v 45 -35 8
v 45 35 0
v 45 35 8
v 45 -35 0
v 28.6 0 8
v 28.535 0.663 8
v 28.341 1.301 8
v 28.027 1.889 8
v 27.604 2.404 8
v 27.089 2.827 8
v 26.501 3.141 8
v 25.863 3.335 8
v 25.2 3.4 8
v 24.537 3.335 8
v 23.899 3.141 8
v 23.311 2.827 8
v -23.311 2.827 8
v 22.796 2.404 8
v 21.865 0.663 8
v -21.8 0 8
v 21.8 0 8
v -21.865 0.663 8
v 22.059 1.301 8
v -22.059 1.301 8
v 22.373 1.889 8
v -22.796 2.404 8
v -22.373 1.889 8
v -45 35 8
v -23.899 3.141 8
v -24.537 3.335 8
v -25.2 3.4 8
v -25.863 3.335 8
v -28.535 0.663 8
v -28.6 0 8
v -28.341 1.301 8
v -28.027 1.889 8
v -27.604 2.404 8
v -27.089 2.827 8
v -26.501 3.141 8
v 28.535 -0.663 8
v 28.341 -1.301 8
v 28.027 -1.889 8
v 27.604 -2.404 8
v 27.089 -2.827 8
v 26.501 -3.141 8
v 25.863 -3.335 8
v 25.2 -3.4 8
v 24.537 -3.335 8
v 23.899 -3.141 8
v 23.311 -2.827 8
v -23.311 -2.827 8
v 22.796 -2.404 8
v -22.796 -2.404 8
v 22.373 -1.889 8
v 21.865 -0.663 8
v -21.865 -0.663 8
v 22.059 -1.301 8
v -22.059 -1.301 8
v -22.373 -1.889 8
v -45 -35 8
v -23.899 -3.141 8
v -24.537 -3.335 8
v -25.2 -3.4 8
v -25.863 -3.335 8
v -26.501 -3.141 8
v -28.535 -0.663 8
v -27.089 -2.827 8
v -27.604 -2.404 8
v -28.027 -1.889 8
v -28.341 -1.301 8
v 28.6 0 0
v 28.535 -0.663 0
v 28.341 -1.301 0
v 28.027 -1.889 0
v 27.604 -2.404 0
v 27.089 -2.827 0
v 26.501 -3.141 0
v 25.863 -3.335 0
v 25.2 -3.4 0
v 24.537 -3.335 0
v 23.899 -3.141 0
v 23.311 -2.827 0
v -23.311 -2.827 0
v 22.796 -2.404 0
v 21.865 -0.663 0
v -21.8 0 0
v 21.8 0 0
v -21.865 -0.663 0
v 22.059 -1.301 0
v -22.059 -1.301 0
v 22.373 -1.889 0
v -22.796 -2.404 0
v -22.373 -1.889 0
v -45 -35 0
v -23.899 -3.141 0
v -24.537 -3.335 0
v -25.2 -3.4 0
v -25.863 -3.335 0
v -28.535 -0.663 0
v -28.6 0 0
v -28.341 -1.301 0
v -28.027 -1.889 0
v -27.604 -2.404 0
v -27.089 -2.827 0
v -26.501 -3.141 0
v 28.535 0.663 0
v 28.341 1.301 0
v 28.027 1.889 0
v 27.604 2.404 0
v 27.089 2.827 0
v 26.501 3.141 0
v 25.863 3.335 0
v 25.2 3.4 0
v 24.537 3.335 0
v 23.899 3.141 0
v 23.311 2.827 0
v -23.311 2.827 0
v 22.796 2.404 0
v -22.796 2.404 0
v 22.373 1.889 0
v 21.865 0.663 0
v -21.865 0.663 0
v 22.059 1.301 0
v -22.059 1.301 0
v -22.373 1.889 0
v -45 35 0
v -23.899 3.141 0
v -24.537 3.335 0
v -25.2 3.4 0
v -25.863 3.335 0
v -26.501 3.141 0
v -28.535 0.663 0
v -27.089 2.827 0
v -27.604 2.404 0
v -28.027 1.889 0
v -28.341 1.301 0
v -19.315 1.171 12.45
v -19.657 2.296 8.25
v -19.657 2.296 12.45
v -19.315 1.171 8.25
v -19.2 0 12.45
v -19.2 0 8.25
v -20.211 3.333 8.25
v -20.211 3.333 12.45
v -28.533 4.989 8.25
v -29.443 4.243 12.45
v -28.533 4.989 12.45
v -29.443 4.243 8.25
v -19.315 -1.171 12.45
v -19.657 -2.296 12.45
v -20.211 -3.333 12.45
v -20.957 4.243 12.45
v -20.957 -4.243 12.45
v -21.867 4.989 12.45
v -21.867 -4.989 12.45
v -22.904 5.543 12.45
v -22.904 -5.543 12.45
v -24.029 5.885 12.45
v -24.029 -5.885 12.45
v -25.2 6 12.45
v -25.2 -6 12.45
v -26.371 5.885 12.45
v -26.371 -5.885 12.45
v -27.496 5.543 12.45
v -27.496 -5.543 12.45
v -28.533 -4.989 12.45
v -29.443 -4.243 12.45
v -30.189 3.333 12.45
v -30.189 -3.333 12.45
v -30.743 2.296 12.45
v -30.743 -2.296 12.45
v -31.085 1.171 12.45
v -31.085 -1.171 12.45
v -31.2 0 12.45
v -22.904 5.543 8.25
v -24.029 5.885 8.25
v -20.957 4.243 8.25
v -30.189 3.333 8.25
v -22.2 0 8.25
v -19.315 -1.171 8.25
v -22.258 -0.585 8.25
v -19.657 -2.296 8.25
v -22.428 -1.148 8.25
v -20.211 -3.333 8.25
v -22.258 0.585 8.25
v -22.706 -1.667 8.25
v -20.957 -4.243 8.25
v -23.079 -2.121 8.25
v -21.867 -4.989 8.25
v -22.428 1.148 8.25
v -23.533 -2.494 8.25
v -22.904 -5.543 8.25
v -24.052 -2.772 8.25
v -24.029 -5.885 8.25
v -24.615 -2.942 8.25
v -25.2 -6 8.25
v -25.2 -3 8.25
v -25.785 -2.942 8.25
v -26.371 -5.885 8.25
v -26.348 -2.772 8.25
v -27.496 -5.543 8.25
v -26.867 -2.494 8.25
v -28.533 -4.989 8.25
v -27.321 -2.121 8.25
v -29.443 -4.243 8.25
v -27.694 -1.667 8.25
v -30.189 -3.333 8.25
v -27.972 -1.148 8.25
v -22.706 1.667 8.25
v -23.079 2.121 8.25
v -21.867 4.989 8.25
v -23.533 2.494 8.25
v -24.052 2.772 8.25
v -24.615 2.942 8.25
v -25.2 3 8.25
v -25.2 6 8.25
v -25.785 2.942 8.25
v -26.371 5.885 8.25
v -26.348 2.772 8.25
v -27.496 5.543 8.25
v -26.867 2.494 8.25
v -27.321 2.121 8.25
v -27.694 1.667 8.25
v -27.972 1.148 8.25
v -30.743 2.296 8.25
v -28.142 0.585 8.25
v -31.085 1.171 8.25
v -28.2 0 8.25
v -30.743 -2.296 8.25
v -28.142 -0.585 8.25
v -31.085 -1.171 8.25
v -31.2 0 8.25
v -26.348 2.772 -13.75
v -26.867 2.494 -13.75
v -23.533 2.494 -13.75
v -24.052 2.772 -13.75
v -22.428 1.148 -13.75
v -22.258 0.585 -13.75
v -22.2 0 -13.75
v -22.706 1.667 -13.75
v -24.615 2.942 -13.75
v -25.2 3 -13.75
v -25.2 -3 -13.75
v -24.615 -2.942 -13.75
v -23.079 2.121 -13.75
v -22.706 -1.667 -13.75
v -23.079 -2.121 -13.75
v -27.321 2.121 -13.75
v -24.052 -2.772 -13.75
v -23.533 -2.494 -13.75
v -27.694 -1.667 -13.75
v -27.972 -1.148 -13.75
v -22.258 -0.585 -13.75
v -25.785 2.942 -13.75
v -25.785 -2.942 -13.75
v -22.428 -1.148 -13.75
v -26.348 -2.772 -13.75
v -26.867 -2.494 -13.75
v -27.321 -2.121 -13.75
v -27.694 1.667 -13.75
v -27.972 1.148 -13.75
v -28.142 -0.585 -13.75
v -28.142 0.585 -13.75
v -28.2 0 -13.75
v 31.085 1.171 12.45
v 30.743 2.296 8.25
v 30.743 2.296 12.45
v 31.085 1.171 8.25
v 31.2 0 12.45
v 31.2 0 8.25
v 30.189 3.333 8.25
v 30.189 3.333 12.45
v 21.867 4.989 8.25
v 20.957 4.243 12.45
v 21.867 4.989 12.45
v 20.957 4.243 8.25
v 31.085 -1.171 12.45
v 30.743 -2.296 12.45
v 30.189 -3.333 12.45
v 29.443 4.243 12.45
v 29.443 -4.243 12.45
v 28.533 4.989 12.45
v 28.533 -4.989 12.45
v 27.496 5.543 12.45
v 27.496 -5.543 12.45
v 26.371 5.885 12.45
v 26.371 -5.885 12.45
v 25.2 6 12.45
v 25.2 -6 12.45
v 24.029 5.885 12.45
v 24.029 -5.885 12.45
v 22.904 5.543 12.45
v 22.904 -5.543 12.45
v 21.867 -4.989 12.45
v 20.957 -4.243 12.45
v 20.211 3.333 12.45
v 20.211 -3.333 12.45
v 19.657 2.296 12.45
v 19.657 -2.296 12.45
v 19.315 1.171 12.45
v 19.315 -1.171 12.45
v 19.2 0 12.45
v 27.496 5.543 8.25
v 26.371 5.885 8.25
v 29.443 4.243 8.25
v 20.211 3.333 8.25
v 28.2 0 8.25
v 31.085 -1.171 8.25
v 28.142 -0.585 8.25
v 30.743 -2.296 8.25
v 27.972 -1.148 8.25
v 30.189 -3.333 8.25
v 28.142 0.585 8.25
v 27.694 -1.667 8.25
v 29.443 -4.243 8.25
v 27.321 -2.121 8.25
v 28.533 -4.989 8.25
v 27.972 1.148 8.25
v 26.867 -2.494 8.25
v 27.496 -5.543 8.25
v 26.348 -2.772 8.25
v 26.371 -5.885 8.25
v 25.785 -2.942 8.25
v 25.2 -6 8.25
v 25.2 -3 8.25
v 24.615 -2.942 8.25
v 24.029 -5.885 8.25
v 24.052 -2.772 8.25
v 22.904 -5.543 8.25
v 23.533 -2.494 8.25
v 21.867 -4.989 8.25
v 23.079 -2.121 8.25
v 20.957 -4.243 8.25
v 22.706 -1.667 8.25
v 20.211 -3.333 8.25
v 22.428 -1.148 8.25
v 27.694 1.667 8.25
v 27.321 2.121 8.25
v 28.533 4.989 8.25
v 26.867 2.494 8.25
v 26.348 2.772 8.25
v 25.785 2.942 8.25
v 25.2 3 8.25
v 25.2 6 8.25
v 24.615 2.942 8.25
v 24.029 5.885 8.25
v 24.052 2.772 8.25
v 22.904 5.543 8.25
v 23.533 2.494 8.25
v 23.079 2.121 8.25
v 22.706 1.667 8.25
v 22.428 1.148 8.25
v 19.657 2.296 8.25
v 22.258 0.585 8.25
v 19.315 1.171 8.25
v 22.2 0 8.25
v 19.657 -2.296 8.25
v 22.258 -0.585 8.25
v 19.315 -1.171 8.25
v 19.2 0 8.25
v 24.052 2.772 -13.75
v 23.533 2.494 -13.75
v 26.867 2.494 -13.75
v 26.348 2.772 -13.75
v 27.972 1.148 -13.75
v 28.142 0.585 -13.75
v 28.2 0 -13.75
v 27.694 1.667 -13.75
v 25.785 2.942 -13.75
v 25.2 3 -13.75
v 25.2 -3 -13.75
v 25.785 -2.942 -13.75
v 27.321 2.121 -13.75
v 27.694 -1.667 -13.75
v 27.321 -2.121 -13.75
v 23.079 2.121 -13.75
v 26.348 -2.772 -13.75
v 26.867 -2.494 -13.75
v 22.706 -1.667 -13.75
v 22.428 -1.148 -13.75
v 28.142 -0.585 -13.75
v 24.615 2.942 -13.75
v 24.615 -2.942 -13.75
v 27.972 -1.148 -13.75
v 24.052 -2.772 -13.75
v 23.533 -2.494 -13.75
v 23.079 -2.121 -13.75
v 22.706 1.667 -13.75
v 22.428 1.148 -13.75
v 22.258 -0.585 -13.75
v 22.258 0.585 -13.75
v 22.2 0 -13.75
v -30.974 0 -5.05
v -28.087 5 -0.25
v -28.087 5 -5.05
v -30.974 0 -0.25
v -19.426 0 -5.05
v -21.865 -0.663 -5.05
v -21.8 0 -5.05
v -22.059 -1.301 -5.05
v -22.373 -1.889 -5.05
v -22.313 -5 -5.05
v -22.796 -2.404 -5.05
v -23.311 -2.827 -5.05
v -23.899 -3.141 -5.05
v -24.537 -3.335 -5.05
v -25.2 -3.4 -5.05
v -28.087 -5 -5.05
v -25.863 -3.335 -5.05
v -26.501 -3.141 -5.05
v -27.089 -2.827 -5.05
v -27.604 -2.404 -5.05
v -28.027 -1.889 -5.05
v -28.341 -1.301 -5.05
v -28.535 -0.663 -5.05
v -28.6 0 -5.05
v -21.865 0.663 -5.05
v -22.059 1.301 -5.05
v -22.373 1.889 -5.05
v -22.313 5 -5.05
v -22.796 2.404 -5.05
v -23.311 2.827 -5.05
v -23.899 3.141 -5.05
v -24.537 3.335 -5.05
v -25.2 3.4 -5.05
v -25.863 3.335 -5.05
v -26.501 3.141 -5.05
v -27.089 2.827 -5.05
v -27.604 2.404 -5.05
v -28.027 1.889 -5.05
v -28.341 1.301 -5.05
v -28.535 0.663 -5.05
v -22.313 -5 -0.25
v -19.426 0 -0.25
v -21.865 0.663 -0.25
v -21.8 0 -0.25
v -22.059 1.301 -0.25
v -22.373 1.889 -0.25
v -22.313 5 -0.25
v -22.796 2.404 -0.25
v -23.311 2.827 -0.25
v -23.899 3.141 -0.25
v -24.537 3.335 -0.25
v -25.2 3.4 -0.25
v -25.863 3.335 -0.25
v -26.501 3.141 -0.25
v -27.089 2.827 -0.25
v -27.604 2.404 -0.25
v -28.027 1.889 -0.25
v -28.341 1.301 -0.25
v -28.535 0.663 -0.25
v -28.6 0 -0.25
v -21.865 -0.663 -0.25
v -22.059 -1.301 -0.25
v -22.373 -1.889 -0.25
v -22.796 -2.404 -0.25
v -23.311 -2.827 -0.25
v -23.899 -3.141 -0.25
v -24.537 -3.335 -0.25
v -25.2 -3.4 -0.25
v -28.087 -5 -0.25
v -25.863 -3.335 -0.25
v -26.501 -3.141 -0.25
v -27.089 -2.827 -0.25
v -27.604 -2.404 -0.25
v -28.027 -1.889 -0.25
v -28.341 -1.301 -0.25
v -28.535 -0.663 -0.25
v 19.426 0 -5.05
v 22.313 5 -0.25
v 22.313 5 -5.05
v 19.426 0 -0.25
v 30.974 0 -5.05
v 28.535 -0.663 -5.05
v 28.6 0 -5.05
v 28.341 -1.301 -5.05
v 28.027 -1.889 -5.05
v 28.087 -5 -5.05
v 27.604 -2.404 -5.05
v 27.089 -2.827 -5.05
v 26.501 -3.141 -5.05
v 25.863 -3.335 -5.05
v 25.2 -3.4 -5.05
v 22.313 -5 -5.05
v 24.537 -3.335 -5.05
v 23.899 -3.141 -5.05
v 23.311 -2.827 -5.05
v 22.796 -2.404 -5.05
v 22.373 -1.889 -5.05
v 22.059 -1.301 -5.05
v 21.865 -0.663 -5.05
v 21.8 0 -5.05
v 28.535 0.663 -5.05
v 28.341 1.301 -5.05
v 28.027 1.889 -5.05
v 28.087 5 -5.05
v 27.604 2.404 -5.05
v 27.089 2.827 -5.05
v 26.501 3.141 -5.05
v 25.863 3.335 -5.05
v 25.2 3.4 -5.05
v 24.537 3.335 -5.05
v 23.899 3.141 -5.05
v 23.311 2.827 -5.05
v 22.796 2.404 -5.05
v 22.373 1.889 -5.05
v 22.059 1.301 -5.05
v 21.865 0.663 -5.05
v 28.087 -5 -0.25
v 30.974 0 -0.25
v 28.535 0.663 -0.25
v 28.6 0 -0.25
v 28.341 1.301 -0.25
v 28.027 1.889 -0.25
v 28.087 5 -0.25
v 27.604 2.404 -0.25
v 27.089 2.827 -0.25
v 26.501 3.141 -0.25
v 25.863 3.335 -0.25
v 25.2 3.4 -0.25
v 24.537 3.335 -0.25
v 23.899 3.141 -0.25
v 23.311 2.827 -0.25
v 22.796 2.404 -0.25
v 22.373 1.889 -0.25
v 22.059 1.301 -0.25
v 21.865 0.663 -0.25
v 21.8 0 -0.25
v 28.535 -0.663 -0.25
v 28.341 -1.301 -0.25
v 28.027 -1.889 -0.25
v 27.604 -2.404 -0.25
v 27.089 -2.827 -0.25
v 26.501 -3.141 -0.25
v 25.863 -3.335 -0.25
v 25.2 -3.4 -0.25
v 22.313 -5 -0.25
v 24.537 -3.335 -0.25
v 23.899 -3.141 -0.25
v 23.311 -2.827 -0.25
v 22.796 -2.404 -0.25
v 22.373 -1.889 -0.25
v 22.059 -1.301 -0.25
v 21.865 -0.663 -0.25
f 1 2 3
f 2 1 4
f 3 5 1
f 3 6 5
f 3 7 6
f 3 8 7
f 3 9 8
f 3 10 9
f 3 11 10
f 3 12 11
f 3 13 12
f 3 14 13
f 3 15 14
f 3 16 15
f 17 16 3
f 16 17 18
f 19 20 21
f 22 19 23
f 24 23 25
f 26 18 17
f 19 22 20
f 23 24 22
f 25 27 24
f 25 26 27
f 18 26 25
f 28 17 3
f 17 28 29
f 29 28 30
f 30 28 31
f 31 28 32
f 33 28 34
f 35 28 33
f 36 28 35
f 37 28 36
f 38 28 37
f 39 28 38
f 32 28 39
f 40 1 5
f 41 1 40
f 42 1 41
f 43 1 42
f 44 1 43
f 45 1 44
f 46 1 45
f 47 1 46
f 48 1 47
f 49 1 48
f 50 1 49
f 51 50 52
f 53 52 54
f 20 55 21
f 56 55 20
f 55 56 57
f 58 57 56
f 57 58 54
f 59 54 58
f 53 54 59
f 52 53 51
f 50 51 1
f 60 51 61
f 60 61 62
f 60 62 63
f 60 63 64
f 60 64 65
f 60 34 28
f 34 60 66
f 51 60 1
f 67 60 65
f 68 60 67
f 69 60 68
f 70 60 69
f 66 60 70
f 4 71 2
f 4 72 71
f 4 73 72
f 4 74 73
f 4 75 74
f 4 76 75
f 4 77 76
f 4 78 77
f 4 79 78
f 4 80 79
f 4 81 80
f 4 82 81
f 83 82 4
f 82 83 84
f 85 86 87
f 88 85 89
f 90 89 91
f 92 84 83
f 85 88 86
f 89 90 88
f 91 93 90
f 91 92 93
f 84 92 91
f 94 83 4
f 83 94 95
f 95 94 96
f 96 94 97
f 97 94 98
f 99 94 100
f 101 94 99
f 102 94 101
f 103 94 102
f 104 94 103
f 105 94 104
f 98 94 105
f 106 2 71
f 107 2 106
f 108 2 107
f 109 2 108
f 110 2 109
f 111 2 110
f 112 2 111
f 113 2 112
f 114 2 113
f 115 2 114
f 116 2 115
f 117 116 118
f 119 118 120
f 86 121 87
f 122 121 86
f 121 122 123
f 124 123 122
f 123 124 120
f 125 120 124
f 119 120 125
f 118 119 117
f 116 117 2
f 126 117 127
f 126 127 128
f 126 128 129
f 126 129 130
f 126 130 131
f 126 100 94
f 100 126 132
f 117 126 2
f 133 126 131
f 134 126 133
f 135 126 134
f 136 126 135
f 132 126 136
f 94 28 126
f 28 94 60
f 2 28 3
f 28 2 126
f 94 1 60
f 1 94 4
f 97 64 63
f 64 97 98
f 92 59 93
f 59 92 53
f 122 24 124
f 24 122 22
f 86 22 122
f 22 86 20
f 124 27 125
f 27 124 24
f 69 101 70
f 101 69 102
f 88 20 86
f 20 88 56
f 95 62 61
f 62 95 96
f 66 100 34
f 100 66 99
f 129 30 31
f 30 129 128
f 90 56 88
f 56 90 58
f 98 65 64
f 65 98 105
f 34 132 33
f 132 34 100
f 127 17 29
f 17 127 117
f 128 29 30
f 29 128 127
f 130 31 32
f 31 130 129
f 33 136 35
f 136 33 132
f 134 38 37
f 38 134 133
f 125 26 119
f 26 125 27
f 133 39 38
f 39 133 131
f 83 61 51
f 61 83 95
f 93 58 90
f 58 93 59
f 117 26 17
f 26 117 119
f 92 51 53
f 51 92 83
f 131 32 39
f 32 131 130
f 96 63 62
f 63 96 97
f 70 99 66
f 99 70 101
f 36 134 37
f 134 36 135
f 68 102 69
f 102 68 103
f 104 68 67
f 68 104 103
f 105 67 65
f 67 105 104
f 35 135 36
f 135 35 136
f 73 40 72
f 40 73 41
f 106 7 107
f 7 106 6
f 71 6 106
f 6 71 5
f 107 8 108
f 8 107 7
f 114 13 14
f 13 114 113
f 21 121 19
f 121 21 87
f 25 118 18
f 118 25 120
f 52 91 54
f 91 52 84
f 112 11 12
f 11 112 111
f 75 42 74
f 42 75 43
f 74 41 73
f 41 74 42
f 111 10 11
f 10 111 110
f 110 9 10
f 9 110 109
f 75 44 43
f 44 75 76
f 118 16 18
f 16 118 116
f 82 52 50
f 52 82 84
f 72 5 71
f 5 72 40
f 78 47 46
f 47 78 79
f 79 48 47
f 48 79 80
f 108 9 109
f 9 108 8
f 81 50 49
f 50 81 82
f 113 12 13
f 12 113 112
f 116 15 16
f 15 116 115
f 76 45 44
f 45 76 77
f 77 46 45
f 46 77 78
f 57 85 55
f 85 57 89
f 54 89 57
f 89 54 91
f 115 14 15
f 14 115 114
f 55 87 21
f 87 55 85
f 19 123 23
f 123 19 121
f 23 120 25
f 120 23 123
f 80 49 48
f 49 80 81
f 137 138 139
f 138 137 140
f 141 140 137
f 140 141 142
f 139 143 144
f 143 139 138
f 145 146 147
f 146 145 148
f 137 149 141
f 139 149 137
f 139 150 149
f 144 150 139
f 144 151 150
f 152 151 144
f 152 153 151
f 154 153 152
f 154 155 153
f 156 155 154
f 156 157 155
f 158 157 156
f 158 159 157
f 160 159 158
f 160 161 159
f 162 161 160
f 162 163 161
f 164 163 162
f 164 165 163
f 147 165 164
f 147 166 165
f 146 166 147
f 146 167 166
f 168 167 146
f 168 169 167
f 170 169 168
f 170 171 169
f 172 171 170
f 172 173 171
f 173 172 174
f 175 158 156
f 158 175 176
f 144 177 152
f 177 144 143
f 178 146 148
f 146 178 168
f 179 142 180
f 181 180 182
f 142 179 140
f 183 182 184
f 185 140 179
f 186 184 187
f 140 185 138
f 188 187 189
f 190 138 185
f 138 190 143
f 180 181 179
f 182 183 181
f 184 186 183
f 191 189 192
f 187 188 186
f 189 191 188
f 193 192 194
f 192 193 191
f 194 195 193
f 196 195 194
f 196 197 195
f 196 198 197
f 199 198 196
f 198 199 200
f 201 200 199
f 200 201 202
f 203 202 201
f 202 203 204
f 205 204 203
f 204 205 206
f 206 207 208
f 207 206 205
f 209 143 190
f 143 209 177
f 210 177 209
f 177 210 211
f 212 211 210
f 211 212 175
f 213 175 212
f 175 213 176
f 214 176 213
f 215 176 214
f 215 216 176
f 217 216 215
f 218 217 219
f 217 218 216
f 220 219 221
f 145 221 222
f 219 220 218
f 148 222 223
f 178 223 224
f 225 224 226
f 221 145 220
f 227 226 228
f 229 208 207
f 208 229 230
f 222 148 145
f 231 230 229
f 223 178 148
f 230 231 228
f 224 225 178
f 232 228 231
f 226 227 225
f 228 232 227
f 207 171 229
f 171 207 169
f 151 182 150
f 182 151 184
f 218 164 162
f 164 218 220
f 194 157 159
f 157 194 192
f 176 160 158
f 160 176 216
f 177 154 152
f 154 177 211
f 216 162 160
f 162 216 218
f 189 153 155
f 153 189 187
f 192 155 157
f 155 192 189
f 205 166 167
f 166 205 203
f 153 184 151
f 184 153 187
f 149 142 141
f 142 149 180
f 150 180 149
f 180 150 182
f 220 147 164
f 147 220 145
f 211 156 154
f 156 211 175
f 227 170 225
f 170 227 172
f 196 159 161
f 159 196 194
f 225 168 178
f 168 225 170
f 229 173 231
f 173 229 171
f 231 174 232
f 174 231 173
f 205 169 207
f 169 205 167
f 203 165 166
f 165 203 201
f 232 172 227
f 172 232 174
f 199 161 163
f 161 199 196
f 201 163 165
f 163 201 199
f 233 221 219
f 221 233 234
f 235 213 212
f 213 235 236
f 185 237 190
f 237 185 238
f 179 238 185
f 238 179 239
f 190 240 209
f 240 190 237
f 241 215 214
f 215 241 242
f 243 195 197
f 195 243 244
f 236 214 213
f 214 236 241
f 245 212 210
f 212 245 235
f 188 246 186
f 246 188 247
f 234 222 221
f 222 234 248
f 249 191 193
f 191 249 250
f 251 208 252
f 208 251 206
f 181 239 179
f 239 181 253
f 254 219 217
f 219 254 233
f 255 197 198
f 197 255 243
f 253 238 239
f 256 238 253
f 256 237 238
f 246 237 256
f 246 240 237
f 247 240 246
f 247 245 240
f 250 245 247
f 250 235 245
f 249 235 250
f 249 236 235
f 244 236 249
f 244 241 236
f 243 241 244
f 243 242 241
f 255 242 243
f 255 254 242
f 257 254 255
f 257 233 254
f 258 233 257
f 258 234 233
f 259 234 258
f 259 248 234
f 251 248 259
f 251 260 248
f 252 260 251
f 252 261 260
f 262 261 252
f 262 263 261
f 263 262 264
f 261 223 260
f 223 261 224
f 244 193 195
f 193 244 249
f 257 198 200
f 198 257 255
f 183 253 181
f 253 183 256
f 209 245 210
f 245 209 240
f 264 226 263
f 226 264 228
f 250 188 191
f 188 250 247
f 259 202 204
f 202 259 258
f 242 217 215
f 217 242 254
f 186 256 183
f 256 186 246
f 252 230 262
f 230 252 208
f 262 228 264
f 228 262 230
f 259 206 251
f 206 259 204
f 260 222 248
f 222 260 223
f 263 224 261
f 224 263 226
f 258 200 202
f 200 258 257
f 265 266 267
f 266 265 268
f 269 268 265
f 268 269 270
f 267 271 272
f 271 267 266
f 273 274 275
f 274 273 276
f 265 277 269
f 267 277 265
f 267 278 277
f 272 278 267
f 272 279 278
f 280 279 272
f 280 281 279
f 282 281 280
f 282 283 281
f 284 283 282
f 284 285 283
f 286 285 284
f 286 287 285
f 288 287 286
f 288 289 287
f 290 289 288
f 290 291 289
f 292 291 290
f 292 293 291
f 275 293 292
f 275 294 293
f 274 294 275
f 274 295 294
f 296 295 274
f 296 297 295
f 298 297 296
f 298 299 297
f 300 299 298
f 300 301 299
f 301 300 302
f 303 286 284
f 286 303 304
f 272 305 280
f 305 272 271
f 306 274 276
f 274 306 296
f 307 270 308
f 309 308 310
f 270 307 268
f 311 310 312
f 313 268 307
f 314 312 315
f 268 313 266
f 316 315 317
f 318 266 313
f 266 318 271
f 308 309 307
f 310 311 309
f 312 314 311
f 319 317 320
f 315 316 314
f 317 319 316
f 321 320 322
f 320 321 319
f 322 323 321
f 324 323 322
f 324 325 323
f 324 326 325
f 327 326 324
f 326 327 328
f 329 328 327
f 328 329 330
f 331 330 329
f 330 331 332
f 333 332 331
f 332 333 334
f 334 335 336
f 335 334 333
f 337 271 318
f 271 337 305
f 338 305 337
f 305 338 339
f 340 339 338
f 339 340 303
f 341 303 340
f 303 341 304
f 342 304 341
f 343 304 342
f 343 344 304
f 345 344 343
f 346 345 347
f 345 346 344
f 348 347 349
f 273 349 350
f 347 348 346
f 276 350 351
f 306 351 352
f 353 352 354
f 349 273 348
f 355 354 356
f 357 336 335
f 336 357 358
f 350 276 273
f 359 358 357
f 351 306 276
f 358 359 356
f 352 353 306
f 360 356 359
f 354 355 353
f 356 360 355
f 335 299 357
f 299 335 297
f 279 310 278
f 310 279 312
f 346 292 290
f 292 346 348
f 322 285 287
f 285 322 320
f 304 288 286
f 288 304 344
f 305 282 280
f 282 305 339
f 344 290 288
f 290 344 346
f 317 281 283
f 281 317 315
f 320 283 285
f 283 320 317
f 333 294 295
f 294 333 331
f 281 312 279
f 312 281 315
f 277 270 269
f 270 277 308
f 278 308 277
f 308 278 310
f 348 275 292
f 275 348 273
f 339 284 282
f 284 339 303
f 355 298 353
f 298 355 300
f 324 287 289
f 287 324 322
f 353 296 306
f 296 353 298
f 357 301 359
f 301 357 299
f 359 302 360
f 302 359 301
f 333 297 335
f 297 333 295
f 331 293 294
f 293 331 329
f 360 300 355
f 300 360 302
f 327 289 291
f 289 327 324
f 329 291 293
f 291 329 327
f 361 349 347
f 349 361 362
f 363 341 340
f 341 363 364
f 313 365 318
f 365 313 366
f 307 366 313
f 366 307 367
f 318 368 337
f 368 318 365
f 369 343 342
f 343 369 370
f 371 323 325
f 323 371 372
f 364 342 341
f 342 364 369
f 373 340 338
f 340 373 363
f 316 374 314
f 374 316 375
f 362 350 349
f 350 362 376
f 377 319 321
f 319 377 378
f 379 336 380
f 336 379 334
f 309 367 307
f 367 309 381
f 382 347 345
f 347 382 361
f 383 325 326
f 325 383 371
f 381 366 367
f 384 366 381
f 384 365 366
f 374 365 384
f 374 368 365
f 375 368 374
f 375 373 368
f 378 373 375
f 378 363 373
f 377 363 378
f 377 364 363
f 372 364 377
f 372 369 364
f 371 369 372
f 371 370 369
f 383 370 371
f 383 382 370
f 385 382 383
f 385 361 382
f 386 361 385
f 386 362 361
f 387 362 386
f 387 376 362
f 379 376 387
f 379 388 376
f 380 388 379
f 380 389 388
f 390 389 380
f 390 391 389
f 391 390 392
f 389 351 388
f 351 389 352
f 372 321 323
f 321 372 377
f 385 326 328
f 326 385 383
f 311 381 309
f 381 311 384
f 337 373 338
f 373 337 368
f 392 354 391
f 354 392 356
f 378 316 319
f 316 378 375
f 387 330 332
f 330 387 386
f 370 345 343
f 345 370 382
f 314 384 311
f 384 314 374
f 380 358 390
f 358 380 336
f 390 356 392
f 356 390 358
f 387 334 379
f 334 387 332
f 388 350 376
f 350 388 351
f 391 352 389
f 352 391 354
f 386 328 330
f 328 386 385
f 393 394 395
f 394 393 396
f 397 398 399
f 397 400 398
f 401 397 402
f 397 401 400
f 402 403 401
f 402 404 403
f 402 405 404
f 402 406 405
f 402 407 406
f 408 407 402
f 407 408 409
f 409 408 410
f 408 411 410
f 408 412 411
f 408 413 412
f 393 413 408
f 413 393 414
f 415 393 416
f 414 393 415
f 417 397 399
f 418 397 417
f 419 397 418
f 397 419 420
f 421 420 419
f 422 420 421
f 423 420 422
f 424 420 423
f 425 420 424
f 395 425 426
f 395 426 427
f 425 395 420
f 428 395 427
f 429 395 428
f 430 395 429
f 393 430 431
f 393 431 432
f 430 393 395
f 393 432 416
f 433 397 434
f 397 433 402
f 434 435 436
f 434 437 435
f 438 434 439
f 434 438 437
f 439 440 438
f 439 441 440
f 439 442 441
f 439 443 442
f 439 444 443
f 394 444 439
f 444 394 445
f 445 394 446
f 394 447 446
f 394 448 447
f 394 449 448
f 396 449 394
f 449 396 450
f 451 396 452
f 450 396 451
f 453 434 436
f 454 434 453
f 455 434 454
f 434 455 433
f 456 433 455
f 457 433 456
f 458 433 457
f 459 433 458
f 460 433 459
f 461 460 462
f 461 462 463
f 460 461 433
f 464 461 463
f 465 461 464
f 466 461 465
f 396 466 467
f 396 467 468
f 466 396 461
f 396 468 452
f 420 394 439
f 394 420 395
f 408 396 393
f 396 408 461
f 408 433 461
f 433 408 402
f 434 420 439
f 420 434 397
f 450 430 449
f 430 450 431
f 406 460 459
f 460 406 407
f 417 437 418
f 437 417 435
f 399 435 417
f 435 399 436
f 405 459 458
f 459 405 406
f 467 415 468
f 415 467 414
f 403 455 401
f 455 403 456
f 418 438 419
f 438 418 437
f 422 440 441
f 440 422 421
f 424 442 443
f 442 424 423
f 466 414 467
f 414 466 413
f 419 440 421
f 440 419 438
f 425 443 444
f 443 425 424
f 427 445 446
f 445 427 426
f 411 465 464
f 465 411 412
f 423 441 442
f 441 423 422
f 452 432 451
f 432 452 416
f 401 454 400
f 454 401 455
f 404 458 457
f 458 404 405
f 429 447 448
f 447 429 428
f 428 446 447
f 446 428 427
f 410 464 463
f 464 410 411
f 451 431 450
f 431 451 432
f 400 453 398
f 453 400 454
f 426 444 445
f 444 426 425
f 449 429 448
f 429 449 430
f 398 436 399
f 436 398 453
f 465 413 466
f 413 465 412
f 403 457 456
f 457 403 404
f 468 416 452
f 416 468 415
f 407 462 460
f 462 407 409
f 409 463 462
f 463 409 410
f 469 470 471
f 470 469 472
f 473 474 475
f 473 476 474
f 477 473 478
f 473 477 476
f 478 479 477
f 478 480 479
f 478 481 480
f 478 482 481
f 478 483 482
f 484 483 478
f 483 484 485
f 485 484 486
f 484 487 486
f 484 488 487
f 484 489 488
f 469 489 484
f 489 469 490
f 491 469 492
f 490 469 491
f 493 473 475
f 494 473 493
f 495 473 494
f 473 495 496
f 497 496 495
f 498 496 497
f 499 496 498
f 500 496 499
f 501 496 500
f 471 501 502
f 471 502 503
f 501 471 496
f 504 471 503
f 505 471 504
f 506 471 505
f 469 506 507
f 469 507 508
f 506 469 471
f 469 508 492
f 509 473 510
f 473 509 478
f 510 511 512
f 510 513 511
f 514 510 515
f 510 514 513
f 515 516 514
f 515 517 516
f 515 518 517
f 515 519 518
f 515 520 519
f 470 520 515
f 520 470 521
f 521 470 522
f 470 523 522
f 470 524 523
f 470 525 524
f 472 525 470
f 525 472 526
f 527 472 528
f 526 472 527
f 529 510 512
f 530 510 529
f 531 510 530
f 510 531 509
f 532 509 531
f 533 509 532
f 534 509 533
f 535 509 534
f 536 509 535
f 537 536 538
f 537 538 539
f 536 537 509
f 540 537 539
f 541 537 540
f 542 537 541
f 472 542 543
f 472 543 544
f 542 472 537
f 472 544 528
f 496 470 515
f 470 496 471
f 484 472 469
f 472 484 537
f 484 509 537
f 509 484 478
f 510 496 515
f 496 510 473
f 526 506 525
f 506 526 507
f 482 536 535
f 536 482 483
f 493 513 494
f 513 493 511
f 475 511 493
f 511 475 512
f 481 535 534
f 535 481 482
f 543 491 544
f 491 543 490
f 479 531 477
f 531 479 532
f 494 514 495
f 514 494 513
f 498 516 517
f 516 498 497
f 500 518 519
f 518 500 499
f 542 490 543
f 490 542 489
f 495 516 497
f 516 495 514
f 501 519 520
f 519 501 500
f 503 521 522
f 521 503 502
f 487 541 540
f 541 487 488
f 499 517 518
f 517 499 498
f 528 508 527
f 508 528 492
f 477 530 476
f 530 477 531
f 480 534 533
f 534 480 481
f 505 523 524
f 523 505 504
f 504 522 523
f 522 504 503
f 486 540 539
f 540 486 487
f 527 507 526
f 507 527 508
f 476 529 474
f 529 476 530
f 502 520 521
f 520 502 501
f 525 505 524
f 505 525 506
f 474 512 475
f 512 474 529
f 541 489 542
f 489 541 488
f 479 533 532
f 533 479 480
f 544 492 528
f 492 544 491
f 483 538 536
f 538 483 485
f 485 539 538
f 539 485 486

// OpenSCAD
$fn = 32;

// ------------------------------------------------------------------------
// Bolted plate: 90 x 70 x 8 mm plate, 2 fasteners
// Every part is its own module, assembly() places them once.
// ------------------------------------------------------------------------

// --- part 1 ---
module plate() {
  difference() {
    translate([-45, -35, 0]) cube([90, 70, 8]);
    translate([-25.2, 0, -1]) cylinder(h = 10, d = 6.8);
    translate([25.2, 0, -1]) cylinder(h = 10, d = 6.8);
  }
}

// --- part 2 ---
module bolt1() {
  cylinder(h = 4.2, d = 12);
  translate([0, 0, -22]) cylinder(h = 22, d = 6);
}

// --- part 3 ---
module bolt2() {
  cylinder(h = 4.2, d = 12);
  translate([0, 0, -22]) cylinder(h = 22, d = 6);
}

// --- part 4 ---
module nut1() {
  difference() {
    linear_extrude(height = 4.8) polygon(points = [[5.774, 0], [2.887, 5], [-2.887, 5], [-5.774, 0], [-2.887, -5], [2.887, -5]]);
    translate([0, 0, -1]) cylinder(h = 6.8, d = 6.8);
  }
}

// --- part 5 ---
module nut2() {
  difference() {
    linear_extrude(height = 4.8) polygon(points = [[5.774, 0], [2.887, 5], [-2.887, 5], [-5.774, 0], [-2.887, -5], [2.887, -5]]);
    translate([0, 0, -1]) cylinder(h = 6.8, d = 6.8);
  }
}

// --- assembly ---
module assembly() {
  translate([0, 0, 0]) rotate([0, 0, 0]) plate();
  translate([-25.2, 0, 8.25]) rotate([0, 0, 0]) bolt1();
  translate([25.2, 0, 8.25]) rotate([0, 0, 0]) bolt2();
  translate([-25.2, 0, -5.05]) rotate([0, 0, 0]) nut1();
  translate([25.2, 0, -5.05]) rotate([0, 0, 0]) nut2();
}

assembly();
